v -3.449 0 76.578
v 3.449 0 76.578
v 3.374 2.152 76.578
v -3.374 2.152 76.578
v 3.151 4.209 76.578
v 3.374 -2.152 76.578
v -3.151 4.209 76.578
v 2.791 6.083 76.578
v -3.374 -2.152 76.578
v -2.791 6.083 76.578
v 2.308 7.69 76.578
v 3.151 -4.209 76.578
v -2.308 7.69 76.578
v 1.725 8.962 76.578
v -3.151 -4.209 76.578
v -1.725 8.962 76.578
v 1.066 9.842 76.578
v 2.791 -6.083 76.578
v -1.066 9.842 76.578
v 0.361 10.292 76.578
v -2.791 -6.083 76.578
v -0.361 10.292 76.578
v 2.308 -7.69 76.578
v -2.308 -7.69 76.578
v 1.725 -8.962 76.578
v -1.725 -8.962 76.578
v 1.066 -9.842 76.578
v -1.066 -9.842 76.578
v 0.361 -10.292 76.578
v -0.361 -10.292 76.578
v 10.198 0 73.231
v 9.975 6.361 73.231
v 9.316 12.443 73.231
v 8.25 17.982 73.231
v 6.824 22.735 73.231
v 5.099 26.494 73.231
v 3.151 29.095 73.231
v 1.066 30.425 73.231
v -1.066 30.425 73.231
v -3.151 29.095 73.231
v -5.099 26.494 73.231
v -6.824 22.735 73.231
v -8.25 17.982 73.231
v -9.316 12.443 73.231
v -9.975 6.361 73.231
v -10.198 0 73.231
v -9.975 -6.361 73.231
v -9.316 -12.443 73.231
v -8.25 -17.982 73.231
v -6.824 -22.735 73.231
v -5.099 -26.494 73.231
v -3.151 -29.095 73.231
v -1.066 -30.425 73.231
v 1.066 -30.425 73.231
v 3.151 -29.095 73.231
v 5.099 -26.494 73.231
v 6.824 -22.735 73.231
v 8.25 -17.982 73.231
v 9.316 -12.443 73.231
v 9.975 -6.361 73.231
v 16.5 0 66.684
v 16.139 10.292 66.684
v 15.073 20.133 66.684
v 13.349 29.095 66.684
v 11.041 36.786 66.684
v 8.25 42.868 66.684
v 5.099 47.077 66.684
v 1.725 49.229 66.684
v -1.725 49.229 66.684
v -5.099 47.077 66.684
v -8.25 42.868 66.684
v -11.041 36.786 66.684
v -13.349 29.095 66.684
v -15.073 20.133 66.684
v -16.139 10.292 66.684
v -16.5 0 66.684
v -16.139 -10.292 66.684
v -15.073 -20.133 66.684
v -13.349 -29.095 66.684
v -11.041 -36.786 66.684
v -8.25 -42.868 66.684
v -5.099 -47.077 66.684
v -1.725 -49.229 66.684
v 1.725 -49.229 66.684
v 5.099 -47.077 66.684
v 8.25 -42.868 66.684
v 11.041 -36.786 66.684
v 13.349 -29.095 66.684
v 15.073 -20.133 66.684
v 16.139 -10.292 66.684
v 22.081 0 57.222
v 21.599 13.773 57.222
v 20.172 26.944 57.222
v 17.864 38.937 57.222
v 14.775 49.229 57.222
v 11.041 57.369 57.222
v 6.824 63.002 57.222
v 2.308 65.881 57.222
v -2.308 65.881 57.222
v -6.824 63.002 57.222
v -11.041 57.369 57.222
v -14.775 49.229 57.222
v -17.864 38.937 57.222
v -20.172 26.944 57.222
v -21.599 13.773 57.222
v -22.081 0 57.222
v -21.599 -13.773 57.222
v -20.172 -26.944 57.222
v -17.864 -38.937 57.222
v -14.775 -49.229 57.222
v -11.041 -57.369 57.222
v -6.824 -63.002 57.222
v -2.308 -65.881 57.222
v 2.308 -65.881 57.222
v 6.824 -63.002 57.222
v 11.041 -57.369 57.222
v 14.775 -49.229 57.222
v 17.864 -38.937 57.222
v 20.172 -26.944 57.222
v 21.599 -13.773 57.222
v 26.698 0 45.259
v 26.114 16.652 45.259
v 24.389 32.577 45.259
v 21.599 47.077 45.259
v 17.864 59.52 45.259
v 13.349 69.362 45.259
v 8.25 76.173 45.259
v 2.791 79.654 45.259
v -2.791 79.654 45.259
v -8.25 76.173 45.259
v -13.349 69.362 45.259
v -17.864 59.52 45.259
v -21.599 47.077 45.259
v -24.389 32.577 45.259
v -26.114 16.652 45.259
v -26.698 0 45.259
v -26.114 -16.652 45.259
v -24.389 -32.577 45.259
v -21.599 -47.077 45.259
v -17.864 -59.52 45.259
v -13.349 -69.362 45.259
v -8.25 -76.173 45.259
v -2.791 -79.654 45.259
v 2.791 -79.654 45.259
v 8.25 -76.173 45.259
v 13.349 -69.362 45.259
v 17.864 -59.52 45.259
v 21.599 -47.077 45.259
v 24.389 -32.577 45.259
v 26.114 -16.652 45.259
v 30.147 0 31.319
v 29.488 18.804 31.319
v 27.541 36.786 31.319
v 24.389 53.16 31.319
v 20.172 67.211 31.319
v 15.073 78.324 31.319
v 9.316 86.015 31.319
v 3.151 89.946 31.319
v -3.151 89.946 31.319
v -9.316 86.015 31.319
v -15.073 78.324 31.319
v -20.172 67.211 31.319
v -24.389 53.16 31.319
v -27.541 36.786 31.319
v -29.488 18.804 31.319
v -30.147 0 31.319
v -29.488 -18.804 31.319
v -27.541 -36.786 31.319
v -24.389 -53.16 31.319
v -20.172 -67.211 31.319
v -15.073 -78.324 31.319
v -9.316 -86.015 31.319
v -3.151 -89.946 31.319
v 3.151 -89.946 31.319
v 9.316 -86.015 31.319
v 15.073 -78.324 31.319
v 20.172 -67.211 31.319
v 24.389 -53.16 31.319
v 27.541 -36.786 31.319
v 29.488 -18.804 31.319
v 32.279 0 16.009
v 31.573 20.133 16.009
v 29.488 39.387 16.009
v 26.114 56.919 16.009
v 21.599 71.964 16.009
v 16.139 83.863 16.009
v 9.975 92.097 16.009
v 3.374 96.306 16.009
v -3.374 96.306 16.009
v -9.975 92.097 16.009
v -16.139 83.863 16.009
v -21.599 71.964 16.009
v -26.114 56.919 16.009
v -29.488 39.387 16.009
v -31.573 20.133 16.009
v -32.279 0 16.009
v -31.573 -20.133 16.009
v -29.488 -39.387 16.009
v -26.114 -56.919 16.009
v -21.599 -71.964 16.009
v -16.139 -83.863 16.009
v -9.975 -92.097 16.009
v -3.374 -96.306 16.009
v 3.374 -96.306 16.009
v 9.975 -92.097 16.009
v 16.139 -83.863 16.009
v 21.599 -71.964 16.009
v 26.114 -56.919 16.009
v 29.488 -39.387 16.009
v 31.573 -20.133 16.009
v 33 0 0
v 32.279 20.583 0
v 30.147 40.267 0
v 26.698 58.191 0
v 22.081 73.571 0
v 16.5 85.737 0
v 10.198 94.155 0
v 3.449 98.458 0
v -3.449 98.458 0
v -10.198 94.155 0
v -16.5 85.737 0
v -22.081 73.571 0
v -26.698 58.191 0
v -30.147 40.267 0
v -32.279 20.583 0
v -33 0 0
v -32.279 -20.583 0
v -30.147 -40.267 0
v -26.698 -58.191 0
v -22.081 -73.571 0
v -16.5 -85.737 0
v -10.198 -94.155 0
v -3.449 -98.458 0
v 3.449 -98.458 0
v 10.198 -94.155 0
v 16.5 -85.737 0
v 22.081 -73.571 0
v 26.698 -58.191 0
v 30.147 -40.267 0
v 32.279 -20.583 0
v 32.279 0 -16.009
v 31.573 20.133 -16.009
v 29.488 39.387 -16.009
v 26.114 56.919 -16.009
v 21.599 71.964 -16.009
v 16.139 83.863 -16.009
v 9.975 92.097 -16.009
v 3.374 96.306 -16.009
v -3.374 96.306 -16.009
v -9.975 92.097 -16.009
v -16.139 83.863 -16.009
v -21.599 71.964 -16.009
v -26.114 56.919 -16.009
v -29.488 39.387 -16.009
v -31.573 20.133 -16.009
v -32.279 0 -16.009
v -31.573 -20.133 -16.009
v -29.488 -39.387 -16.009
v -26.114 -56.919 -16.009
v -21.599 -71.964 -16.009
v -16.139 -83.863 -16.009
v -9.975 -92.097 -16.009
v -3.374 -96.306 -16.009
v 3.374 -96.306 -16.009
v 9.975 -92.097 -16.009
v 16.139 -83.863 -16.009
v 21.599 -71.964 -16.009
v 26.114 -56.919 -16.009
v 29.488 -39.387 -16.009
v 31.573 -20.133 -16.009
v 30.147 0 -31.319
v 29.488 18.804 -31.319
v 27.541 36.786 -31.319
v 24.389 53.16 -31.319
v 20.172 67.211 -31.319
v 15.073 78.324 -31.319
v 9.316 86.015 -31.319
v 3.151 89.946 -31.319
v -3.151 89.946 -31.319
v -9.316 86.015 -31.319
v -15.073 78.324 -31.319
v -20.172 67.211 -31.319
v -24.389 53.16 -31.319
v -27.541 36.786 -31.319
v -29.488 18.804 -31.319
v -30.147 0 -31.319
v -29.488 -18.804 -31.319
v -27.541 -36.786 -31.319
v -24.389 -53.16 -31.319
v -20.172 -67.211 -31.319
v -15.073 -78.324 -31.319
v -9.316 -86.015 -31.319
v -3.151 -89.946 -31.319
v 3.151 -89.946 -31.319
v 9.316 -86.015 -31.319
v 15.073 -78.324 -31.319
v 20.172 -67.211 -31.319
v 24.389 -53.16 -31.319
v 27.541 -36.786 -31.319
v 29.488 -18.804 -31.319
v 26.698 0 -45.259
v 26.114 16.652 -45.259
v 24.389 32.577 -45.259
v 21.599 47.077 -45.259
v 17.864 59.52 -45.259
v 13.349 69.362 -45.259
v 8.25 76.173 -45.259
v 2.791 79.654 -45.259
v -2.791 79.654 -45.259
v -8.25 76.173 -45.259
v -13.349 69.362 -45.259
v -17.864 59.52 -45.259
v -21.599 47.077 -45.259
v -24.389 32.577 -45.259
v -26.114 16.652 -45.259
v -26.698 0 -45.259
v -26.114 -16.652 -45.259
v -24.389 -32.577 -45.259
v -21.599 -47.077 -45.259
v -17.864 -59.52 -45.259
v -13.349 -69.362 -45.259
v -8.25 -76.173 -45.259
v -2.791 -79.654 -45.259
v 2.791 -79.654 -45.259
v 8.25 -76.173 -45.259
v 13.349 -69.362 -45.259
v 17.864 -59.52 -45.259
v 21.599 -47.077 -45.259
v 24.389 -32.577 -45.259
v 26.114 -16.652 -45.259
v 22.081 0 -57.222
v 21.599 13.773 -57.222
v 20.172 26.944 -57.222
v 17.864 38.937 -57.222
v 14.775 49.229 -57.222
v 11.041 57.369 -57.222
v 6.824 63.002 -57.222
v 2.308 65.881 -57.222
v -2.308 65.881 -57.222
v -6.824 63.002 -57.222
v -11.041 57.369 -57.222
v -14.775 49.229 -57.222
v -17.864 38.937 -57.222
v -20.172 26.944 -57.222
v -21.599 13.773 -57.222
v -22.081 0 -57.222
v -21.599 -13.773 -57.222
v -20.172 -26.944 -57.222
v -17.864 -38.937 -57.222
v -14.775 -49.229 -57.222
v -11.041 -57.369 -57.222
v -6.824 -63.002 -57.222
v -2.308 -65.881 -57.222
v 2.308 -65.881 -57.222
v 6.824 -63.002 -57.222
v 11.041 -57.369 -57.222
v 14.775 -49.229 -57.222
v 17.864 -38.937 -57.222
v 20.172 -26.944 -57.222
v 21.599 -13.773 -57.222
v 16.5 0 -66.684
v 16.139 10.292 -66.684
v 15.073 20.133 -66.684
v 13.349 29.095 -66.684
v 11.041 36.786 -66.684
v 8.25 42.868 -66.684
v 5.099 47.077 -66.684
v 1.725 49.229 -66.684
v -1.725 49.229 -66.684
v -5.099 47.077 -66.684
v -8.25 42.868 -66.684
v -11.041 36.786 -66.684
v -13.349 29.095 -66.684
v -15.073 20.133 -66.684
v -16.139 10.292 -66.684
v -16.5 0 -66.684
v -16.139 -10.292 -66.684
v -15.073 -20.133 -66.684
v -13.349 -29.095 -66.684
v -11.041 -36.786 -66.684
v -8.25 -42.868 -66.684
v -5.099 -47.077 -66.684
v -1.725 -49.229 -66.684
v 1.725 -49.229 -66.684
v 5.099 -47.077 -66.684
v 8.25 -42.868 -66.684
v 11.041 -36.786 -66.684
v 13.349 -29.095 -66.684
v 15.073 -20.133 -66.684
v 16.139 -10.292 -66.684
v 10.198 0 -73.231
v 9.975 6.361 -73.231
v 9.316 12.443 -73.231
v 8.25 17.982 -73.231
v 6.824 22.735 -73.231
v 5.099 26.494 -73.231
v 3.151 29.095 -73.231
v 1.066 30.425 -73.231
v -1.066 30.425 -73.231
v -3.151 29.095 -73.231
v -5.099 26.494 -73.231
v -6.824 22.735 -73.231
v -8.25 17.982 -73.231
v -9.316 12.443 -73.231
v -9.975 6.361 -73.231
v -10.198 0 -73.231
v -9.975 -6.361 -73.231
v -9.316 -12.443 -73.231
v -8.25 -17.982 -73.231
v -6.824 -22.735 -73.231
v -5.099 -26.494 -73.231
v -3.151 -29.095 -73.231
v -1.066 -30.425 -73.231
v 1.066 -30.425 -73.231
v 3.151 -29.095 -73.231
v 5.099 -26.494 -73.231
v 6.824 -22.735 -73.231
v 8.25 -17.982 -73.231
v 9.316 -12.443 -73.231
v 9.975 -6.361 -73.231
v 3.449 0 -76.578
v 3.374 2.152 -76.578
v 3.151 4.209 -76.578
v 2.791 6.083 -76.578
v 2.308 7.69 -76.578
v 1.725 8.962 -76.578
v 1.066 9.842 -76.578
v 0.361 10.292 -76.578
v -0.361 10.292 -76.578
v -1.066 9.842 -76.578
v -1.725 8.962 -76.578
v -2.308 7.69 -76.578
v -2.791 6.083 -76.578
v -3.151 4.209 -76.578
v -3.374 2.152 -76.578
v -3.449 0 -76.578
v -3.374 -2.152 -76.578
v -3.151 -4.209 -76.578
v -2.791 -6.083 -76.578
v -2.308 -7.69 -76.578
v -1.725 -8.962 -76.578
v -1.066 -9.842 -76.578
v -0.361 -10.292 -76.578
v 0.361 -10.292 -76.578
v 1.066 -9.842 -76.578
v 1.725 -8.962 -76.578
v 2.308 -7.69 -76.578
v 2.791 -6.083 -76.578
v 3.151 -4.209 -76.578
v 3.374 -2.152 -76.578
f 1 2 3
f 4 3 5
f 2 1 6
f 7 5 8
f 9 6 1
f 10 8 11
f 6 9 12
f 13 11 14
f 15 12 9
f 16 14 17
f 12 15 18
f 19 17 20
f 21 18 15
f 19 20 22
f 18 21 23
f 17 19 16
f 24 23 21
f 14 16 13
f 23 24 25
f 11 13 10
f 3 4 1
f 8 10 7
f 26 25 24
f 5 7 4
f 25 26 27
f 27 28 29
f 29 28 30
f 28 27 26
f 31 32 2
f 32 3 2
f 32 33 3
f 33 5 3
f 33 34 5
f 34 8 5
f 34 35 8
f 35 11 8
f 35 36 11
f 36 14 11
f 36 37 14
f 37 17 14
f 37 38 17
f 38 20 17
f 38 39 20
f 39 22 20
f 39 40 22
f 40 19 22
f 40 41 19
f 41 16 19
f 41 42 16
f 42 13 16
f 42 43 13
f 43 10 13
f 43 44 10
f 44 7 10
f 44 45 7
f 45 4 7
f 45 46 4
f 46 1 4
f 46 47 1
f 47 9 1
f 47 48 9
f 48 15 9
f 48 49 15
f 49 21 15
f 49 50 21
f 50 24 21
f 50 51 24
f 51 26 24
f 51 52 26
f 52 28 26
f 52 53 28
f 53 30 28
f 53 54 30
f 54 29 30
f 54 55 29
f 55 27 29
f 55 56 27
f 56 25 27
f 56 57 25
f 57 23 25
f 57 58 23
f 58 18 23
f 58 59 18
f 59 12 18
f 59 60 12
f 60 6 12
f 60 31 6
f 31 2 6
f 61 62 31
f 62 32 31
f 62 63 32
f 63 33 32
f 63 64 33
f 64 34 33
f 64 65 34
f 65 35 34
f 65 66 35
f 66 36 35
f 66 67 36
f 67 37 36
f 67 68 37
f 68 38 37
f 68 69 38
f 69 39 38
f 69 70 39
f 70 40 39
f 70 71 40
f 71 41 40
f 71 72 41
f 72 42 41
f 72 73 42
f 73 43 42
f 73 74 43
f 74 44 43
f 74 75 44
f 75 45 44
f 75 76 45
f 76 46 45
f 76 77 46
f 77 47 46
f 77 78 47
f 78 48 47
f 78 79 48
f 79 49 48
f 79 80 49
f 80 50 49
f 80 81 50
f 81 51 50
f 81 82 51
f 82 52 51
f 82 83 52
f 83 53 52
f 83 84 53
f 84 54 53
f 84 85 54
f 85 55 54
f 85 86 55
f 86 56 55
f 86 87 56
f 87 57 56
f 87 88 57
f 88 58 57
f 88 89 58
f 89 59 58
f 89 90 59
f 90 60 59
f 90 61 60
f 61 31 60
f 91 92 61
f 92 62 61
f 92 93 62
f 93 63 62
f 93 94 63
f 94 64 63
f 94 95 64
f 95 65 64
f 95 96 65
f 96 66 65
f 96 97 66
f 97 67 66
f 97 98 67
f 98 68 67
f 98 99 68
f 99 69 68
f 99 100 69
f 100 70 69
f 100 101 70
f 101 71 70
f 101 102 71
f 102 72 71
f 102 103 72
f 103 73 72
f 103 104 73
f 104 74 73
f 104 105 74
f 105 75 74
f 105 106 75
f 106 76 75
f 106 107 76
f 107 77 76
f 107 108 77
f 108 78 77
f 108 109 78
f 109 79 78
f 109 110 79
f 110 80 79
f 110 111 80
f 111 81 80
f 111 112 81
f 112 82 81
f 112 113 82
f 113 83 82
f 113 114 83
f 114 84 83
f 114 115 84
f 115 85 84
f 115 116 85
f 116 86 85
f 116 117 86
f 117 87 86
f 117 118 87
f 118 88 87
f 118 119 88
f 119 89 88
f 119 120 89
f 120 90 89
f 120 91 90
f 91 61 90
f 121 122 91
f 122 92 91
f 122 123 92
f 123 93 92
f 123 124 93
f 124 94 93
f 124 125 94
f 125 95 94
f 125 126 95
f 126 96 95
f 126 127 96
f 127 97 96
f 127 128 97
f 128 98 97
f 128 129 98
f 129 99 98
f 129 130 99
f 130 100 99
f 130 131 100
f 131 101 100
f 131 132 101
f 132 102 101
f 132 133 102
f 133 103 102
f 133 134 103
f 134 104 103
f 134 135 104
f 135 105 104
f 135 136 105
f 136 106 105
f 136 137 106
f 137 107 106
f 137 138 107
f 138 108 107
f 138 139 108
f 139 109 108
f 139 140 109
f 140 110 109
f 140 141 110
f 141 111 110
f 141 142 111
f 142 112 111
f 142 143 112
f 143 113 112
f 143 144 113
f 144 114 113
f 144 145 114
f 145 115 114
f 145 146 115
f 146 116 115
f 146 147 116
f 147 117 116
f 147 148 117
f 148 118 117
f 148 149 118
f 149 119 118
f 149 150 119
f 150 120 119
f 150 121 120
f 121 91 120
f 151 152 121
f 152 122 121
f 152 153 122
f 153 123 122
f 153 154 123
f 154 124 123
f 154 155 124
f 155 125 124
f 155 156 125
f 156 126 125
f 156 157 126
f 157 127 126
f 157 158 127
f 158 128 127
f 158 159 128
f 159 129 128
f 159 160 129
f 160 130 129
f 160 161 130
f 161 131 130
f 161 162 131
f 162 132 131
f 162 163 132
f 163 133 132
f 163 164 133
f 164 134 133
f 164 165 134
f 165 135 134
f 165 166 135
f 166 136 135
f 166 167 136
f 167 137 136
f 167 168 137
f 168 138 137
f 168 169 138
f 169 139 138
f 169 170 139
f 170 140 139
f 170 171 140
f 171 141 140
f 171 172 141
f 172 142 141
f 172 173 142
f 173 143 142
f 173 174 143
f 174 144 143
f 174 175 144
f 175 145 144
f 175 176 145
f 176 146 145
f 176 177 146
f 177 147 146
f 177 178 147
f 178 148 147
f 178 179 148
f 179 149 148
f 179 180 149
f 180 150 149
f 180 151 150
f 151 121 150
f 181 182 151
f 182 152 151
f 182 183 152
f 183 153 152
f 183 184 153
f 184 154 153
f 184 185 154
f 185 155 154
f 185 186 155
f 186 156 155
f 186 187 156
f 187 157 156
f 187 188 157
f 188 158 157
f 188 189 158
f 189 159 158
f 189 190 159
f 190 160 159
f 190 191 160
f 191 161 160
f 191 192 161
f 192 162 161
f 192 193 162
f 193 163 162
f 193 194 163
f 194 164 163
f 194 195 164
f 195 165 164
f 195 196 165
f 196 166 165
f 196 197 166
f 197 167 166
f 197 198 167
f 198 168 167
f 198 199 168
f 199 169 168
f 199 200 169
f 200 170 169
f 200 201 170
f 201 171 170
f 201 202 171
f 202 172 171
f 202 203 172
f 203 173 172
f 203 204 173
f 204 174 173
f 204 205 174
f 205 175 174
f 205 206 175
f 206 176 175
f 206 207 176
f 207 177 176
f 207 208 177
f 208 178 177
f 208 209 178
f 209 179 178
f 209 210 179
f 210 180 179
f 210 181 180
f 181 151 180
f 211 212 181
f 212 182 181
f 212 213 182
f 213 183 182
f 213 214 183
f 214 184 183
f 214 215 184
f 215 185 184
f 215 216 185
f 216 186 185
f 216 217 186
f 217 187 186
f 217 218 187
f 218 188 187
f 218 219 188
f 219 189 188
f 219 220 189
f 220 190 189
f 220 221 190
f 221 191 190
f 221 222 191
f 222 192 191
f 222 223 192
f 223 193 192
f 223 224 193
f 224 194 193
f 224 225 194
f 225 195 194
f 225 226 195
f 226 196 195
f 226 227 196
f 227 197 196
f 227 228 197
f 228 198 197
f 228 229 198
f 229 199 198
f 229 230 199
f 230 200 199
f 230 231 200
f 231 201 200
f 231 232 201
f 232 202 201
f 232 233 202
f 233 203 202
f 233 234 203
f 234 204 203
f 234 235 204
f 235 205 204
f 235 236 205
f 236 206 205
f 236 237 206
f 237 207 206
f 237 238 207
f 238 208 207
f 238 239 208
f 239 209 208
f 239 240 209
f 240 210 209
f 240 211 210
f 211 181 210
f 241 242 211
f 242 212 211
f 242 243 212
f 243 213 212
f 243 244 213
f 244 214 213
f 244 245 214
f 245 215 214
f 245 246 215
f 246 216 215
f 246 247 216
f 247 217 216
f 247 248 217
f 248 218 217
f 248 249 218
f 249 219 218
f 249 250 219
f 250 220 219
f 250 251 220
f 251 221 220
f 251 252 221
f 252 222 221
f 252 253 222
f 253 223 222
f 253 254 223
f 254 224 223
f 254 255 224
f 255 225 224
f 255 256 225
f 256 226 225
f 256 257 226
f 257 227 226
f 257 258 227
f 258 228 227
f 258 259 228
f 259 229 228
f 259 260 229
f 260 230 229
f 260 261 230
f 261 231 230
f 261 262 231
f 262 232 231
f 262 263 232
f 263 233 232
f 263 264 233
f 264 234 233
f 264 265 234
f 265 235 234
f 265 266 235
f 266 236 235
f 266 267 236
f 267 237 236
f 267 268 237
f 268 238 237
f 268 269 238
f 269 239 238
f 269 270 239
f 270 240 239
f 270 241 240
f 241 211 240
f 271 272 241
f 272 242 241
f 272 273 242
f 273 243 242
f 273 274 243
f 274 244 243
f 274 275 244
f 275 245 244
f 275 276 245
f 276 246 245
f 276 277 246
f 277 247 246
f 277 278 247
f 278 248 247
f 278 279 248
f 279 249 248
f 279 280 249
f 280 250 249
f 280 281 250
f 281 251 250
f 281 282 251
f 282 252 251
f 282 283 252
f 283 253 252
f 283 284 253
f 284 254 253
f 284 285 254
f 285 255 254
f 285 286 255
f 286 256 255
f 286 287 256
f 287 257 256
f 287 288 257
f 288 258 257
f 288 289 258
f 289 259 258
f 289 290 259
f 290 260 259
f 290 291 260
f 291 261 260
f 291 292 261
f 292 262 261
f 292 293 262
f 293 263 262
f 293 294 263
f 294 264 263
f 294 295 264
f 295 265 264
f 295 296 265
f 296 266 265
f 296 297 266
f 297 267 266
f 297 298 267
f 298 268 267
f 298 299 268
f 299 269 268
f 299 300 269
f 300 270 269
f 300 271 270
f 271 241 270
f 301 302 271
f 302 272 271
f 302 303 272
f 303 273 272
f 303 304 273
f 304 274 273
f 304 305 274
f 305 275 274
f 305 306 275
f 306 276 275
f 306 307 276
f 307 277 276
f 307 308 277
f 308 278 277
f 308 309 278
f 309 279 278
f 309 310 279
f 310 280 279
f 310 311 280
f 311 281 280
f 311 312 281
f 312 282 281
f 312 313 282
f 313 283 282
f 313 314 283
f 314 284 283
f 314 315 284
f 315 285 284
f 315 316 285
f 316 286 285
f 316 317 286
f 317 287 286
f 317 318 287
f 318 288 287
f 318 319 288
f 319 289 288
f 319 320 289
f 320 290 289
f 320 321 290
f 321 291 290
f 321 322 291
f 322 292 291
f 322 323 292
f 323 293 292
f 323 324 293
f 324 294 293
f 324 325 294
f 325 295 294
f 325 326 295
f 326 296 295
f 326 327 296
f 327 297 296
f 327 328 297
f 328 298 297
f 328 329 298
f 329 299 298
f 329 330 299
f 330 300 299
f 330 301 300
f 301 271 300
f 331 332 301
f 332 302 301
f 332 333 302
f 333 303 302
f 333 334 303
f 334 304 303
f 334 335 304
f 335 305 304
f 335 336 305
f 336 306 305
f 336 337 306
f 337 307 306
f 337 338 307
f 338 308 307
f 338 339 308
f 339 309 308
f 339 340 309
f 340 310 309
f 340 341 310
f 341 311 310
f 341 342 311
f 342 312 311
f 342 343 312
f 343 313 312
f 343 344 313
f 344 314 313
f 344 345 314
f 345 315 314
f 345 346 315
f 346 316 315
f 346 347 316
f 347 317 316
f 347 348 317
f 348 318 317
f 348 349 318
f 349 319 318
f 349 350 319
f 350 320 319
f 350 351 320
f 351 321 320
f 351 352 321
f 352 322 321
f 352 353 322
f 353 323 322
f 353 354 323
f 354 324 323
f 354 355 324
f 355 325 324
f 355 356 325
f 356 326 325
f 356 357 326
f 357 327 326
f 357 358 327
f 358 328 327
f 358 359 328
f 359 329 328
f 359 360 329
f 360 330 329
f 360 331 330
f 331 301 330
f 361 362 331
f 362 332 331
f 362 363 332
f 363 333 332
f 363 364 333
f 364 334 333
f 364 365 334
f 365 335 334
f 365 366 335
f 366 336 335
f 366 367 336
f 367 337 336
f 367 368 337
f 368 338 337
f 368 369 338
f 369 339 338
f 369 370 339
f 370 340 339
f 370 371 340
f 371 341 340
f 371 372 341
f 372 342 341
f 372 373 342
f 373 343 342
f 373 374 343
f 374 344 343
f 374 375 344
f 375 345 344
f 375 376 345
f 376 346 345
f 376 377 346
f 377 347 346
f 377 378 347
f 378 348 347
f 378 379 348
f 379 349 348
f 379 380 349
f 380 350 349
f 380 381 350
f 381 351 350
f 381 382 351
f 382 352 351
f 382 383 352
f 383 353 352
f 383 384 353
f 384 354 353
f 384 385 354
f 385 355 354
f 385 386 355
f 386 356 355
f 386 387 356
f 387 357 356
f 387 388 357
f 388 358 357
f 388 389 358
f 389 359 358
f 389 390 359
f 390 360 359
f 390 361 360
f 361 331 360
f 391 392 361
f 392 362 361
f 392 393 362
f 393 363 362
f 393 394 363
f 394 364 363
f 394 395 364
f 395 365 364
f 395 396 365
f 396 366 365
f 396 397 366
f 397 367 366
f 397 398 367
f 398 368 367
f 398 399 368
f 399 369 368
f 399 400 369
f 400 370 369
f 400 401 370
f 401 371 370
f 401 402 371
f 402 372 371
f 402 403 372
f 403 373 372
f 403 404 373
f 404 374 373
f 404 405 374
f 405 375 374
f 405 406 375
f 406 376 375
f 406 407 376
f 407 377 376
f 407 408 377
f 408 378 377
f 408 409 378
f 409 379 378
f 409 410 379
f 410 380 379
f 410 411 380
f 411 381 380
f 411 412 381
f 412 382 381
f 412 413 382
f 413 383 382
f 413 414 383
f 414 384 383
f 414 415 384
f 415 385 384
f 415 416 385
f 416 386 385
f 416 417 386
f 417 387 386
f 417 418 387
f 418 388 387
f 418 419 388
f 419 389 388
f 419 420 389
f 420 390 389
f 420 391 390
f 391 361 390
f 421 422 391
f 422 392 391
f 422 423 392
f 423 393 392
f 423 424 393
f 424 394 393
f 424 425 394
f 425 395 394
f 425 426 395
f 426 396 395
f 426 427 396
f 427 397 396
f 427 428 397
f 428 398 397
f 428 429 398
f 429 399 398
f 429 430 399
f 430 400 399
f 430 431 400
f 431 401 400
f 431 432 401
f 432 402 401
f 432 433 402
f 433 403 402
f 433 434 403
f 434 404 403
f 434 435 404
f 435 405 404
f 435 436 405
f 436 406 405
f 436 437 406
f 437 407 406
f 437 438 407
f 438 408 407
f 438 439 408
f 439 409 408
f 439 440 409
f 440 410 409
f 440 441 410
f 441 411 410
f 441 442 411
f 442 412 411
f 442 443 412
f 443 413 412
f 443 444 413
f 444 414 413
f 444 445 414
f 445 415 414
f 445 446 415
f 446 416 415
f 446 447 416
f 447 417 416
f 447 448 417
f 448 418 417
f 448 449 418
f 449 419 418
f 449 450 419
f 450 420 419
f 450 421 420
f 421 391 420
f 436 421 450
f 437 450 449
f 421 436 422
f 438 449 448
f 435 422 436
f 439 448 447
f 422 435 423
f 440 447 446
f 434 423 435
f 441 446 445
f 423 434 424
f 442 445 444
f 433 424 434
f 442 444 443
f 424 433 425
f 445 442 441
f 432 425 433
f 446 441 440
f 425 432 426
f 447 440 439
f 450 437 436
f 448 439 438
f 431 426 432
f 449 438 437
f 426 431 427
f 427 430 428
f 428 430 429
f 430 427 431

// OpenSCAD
// Generated by SolidPython 1.0.1 on 2020-07-29 00:46:45


scale(v = [3, 9, 7]) {
	sphere(r = 11);
}
/***********************************************
*********      SolidPython code:      **********
************************************************
 
# import packages: SolidPython
from solid import *
from solid.utils import *
from itertools import chain, combinations, permutations


class Resize:

    def __init__(self, scad_file):
        self.scad_file = scad_file
        #self.scad_file = import_scad(scad_file)
        # cone/cylinder param:
        self.r1 = 0
        self.r2 = 0
        self.h = 0
        # rectangular prism param:
        self.w = 0
        self.l = 0
        # ellipse param:
        self.r = 0

    # import OpenScad code (file name corresponds to shape)


    # classify shape + parameters
    def assign(self, param1, param2, param3):
        if self.scad_file == 'cone.scad':
            self.r1 = param1
            self.r2 = param2
            self.h = param3
        elif self.scad_file == 'cylinder.scad':
            self.r1 = param1
            self.r2 = param2
            self.h = param3
        elif self.scad_file == 'rectangularPrism.scad':
            self.h = param1
            self.l = param2
            self.w = param3
        else:
            self.r = param1
            self.h = param2

    # resize parameters
    def iterate(self):
        x = range(3, 20, 2)
        i = 1
        if self.scad_file == 'cone.scad':
            tempList = list(permutations(x, 2))
            for temp in tempList:
                param1 = temp[0]
                param2 = temp[1]
                filepath = 'produced_scad_files/' + 'cone' + str(param1) + '_' + str(param2) + '_' + '.scad'
                scad_render_to_file(cylinder(h=param1, r1=param2, r2=0), filepath)

        elif self.scad_file == 'cylinder.scad':
            tempList = list(permutations(x, 3))
            for temp in tempList:
                param1 = temp[0]
                param2 = temp[1]
                filepath = 'produced_scad_files/' + 'cylinder' + str(param1) + '_' + str(param2) + '_' + '.scad'
                scad_render_to_file(cylinder(h=param1, r1=param2, r2=param2), filepath)

        elif self.scad_file == 'rectangularPrism.scad':
            tempList = list(permutations(x, 3))
            for temp in tempList:
                param1 = temp[0]
                param2 = temp[1]
                param3 = temp[2]
                filepath = 'produced_scad_files/' + 'rectangularPrism' + str(param1) + '_' + str(param2) + '_' + str(
                    param3) + '.scad'
                scad_render_to_file(cube(size=(param1, param2, param3)), filepath)

        elif self.scad_file == 'ellipse.scad':
            tempList = list(permutations(x, 4))
            for temp in tempList:
                param1 = temp[0]
                param2 = temp[1]
                param3 = temp[2]
                param4 = temp[3]
                filepath = 'produced_scad_files/' + 'ellipse' + str(param1) + '_' + str(param2) + '_' + str(param3) + '_' + str(param4) + '.scad'
                scad_render_to_file(scale([param1, param2, param3])(sphere(r=param4)), filepath)

    def render_to_scadfile(self):
        scad_render_to_file(scad, 'example.scad') 
 
************************************************/
